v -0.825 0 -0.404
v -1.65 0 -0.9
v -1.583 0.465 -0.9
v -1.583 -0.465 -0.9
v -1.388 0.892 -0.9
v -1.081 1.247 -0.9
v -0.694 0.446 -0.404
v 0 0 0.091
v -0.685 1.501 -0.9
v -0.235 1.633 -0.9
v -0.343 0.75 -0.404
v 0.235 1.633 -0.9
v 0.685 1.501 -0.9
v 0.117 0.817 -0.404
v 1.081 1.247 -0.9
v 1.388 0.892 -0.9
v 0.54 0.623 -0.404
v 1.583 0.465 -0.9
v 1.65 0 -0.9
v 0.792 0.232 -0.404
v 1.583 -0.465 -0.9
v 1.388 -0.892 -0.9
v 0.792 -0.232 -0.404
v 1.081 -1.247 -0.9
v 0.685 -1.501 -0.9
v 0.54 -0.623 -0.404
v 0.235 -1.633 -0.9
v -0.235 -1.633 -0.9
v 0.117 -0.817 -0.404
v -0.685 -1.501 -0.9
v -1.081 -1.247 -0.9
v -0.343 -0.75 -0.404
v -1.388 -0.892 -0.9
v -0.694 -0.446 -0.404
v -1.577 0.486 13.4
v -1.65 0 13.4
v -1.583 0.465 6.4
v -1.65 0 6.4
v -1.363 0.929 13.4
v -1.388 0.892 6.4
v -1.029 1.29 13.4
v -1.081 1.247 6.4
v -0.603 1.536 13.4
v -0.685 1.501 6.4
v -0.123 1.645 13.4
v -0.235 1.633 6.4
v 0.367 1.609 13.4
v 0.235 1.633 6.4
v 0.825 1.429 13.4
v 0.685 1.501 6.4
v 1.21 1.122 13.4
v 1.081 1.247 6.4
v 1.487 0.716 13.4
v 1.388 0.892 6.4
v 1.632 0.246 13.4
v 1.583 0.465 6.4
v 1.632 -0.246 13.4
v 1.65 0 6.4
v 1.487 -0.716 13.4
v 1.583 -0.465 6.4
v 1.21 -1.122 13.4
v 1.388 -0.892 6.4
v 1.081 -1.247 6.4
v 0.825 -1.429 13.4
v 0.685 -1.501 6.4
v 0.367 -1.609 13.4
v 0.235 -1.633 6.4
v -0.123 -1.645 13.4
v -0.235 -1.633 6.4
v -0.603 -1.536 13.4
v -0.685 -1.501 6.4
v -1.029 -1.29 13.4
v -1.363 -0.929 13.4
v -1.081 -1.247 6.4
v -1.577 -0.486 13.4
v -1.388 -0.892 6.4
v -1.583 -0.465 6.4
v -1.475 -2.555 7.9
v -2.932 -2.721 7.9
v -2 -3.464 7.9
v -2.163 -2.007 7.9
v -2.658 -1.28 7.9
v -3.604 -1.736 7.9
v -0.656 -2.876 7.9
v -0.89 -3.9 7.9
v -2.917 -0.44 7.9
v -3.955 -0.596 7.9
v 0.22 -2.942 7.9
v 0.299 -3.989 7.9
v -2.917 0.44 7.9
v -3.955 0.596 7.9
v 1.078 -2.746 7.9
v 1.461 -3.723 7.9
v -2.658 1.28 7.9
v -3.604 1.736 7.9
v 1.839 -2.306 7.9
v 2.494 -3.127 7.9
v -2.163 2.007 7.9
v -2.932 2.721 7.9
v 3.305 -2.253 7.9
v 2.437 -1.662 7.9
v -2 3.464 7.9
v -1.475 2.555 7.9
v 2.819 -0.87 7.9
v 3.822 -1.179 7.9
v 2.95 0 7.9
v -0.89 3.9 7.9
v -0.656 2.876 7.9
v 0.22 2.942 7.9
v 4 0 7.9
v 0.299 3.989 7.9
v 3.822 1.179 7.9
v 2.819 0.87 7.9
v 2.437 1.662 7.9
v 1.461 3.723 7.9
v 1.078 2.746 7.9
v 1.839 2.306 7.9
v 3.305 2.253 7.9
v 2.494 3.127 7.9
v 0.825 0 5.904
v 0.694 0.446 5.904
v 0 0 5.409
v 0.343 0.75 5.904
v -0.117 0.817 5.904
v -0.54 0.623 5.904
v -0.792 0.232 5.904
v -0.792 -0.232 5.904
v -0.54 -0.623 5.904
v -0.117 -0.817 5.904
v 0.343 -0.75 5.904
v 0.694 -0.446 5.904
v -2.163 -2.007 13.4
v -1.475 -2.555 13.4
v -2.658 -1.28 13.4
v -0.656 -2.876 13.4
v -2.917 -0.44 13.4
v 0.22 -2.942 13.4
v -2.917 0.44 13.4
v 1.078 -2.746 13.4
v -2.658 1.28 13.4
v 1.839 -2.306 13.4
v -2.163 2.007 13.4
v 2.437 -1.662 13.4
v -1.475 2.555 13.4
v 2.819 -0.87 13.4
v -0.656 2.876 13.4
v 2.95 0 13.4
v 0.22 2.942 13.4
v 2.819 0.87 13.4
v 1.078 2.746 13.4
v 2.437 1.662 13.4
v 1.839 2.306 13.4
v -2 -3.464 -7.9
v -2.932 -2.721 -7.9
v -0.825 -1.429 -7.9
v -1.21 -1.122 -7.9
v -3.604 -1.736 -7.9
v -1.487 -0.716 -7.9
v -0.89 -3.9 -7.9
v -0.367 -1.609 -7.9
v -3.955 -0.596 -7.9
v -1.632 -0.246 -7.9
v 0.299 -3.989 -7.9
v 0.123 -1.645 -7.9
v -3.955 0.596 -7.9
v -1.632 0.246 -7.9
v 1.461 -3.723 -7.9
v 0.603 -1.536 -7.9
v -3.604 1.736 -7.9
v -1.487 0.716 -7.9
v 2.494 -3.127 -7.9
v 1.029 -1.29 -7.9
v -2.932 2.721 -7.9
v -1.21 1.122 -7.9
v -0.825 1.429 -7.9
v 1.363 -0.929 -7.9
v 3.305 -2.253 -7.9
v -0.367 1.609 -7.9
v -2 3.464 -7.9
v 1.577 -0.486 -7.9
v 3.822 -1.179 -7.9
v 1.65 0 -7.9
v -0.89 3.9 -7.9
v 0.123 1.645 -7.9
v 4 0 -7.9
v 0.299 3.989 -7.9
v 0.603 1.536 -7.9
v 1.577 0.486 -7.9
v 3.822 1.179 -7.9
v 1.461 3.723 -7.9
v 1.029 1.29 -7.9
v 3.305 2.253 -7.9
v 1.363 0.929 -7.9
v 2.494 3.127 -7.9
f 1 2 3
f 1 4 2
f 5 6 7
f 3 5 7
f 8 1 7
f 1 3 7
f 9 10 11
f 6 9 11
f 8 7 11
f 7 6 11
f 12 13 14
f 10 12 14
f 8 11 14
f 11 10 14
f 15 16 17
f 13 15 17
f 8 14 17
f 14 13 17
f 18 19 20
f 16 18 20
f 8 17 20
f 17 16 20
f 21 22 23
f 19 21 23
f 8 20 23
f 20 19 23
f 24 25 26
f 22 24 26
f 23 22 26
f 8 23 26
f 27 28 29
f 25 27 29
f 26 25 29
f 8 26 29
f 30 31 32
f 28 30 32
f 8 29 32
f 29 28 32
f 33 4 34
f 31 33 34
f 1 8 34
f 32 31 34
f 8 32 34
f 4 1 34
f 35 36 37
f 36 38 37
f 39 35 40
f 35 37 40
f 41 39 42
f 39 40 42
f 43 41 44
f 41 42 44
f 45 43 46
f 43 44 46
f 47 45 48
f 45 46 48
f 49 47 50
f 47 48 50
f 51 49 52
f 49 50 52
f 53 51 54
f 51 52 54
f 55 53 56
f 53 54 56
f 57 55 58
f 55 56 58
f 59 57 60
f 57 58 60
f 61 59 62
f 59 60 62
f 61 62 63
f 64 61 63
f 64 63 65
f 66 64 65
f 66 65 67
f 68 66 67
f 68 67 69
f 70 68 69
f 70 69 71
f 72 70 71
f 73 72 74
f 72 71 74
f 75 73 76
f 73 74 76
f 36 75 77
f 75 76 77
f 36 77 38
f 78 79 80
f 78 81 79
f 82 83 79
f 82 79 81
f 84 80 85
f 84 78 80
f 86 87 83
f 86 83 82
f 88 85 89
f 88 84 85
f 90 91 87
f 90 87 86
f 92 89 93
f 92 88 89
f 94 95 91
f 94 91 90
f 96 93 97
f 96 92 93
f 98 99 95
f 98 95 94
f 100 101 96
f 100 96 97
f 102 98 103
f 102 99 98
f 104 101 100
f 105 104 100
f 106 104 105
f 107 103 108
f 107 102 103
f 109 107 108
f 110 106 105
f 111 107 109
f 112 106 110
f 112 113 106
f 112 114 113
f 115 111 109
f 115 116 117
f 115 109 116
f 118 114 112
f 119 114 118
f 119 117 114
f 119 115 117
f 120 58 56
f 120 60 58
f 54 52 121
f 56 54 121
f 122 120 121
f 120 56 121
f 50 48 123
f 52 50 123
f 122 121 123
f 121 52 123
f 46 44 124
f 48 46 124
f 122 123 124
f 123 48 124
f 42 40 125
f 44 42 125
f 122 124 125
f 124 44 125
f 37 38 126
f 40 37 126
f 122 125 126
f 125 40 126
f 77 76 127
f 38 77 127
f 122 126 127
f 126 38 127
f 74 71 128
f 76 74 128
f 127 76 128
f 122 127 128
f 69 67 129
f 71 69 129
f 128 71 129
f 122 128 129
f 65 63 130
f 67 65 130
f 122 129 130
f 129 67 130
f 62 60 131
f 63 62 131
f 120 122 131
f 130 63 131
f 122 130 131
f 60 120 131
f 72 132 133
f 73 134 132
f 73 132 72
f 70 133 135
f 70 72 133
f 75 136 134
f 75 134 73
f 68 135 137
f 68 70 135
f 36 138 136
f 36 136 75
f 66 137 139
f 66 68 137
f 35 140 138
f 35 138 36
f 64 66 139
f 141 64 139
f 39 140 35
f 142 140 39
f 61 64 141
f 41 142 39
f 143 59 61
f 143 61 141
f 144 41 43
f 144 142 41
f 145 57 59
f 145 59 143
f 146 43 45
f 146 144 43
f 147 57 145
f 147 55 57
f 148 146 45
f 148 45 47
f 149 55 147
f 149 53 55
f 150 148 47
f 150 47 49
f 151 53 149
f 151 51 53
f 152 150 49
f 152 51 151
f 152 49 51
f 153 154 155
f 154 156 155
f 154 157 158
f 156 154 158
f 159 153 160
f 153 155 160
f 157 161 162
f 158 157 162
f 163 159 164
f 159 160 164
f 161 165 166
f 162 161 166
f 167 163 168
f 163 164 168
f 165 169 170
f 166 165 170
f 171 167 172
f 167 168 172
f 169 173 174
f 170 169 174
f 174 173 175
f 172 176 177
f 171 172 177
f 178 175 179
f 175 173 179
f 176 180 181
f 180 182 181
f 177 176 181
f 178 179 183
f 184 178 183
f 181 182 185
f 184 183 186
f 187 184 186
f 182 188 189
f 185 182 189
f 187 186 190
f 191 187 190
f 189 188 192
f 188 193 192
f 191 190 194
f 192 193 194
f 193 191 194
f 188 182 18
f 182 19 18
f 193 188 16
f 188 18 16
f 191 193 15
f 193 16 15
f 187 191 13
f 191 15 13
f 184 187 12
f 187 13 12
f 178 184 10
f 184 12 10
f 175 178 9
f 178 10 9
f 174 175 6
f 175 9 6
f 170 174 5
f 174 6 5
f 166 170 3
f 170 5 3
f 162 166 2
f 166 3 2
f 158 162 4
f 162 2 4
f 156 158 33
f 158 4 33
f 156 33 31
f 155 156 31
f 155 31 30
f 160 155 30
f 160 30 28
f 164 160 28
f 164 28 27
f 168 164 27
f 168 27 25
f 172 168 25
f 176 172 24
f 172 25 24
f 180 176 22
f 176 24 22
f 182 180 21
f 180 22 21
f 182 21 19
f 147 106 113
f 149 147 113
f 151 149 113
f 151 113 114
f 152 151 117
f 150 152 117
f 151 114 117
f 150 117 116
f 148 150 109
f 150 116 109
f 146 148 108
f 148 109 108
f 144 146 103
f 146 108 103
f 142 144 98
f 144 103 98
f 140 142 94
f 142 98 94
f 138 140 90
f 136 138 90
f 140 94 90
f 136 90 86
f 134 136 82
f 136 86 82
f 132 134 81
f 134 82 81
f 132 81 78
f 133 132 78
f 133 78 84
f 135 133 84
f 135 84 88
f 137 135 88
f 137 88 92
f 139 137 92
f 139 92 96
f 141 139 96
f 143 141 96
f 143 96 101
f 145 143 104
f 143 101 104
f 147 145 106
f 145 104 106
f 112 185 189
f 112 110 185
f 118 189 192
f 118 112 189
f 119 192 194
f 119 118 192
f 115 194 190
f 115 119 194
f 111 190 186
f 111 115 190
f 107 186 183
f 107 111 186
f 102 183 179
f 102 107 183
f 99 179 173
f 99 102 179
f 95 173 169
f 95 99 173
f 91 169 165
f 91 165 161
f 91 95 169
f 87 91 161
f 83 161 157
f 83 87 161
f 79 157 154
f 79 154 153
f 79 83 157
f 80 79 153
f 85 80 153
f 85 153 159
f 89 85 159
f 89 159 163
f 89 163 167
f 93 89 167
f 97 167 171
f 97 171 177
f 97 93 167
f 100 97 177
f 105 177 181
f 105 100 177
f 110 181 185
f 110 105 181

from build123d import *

# Parameters (mm, degrees)
SKETCH_1_R               = 4
EXTRUDE_1_DEPTH          = 7.9
SKETCH_2_R               = 2.95
EXTRUDE_2_DEPTH          = 5.5
M4X0_7_1_D               = 3.3
M4X0_7_1_DEPTH           = 7
M4X0_7_1_TIP             = 0.991420021
M4X0_7_1_ON_FACE_2_D     = 3.3
M4X0_7_1_ON_FACE_2_DEPTH = 7
M4X0_7_1_ON_FACE_2_TIP   = 0.991420021


with BuildPart() as part:
    # ｽｹｯﾁ1 → ﾎﾞｽ - 押し出し1 (new body, symmetric)
    with BuildSketch(Plane.XY):
        Circle(SKETCH_1_R)
    extrude(amount=EXTRUDE_1_DEPTH, both=True)

    # ｽｹｯﾁ2 → ﾎﾞｽ - 押し出し2 (add)
    with BuildSketch(Plane.XY.offset(7.9)):
        Circle(SKETCH_2_R)
    extrude(amount=EXTRUDE_2_DEPTH)

    # M4x0.7 ねじ穴1
    with Locations(Plane(origin=(0, 0, -7.9), x_dir=(-1, 0, 0), z_dir=(0, 0, -1))):
        with Locations((0, 0)):
            Hole(M4X0_7_1_D / 2, depth=M4X0_7_1_DEPTH)
            with Locations((0, 0, -(M4X0_7_1_DEPTH + M4X0_7_1_TIP / 2))):  # 118° drill point
                Cone(0, M4X0_7_1_D / 2, M4X0_7_1_TIP, mode=Mode.SUBTRACT)

    # M4x0.7 ねじ穴1 on face 2
    with Locations(Plane.XY.offset(13.4)):
        with Locations((0, 0)):
            Hole(M4X0_7_1_ON_FACE_2_D / 2, depth=M4X0_7_1_ON_FACE_2_DEPTH)
            with Locations((0, 0, -(M4X0_7_1_ON_FACE_2_DEPTH + M4X0_7_1_ON_FACE_2_TIP / 2))):  # 118° drill point
                Cone(0, M4X0_7_1_ON_FACE_2_D / 2, M4X0_7_1_ON_FACE_2_TIP, mode=Mode.SUBTRACT)


solid = part.part
